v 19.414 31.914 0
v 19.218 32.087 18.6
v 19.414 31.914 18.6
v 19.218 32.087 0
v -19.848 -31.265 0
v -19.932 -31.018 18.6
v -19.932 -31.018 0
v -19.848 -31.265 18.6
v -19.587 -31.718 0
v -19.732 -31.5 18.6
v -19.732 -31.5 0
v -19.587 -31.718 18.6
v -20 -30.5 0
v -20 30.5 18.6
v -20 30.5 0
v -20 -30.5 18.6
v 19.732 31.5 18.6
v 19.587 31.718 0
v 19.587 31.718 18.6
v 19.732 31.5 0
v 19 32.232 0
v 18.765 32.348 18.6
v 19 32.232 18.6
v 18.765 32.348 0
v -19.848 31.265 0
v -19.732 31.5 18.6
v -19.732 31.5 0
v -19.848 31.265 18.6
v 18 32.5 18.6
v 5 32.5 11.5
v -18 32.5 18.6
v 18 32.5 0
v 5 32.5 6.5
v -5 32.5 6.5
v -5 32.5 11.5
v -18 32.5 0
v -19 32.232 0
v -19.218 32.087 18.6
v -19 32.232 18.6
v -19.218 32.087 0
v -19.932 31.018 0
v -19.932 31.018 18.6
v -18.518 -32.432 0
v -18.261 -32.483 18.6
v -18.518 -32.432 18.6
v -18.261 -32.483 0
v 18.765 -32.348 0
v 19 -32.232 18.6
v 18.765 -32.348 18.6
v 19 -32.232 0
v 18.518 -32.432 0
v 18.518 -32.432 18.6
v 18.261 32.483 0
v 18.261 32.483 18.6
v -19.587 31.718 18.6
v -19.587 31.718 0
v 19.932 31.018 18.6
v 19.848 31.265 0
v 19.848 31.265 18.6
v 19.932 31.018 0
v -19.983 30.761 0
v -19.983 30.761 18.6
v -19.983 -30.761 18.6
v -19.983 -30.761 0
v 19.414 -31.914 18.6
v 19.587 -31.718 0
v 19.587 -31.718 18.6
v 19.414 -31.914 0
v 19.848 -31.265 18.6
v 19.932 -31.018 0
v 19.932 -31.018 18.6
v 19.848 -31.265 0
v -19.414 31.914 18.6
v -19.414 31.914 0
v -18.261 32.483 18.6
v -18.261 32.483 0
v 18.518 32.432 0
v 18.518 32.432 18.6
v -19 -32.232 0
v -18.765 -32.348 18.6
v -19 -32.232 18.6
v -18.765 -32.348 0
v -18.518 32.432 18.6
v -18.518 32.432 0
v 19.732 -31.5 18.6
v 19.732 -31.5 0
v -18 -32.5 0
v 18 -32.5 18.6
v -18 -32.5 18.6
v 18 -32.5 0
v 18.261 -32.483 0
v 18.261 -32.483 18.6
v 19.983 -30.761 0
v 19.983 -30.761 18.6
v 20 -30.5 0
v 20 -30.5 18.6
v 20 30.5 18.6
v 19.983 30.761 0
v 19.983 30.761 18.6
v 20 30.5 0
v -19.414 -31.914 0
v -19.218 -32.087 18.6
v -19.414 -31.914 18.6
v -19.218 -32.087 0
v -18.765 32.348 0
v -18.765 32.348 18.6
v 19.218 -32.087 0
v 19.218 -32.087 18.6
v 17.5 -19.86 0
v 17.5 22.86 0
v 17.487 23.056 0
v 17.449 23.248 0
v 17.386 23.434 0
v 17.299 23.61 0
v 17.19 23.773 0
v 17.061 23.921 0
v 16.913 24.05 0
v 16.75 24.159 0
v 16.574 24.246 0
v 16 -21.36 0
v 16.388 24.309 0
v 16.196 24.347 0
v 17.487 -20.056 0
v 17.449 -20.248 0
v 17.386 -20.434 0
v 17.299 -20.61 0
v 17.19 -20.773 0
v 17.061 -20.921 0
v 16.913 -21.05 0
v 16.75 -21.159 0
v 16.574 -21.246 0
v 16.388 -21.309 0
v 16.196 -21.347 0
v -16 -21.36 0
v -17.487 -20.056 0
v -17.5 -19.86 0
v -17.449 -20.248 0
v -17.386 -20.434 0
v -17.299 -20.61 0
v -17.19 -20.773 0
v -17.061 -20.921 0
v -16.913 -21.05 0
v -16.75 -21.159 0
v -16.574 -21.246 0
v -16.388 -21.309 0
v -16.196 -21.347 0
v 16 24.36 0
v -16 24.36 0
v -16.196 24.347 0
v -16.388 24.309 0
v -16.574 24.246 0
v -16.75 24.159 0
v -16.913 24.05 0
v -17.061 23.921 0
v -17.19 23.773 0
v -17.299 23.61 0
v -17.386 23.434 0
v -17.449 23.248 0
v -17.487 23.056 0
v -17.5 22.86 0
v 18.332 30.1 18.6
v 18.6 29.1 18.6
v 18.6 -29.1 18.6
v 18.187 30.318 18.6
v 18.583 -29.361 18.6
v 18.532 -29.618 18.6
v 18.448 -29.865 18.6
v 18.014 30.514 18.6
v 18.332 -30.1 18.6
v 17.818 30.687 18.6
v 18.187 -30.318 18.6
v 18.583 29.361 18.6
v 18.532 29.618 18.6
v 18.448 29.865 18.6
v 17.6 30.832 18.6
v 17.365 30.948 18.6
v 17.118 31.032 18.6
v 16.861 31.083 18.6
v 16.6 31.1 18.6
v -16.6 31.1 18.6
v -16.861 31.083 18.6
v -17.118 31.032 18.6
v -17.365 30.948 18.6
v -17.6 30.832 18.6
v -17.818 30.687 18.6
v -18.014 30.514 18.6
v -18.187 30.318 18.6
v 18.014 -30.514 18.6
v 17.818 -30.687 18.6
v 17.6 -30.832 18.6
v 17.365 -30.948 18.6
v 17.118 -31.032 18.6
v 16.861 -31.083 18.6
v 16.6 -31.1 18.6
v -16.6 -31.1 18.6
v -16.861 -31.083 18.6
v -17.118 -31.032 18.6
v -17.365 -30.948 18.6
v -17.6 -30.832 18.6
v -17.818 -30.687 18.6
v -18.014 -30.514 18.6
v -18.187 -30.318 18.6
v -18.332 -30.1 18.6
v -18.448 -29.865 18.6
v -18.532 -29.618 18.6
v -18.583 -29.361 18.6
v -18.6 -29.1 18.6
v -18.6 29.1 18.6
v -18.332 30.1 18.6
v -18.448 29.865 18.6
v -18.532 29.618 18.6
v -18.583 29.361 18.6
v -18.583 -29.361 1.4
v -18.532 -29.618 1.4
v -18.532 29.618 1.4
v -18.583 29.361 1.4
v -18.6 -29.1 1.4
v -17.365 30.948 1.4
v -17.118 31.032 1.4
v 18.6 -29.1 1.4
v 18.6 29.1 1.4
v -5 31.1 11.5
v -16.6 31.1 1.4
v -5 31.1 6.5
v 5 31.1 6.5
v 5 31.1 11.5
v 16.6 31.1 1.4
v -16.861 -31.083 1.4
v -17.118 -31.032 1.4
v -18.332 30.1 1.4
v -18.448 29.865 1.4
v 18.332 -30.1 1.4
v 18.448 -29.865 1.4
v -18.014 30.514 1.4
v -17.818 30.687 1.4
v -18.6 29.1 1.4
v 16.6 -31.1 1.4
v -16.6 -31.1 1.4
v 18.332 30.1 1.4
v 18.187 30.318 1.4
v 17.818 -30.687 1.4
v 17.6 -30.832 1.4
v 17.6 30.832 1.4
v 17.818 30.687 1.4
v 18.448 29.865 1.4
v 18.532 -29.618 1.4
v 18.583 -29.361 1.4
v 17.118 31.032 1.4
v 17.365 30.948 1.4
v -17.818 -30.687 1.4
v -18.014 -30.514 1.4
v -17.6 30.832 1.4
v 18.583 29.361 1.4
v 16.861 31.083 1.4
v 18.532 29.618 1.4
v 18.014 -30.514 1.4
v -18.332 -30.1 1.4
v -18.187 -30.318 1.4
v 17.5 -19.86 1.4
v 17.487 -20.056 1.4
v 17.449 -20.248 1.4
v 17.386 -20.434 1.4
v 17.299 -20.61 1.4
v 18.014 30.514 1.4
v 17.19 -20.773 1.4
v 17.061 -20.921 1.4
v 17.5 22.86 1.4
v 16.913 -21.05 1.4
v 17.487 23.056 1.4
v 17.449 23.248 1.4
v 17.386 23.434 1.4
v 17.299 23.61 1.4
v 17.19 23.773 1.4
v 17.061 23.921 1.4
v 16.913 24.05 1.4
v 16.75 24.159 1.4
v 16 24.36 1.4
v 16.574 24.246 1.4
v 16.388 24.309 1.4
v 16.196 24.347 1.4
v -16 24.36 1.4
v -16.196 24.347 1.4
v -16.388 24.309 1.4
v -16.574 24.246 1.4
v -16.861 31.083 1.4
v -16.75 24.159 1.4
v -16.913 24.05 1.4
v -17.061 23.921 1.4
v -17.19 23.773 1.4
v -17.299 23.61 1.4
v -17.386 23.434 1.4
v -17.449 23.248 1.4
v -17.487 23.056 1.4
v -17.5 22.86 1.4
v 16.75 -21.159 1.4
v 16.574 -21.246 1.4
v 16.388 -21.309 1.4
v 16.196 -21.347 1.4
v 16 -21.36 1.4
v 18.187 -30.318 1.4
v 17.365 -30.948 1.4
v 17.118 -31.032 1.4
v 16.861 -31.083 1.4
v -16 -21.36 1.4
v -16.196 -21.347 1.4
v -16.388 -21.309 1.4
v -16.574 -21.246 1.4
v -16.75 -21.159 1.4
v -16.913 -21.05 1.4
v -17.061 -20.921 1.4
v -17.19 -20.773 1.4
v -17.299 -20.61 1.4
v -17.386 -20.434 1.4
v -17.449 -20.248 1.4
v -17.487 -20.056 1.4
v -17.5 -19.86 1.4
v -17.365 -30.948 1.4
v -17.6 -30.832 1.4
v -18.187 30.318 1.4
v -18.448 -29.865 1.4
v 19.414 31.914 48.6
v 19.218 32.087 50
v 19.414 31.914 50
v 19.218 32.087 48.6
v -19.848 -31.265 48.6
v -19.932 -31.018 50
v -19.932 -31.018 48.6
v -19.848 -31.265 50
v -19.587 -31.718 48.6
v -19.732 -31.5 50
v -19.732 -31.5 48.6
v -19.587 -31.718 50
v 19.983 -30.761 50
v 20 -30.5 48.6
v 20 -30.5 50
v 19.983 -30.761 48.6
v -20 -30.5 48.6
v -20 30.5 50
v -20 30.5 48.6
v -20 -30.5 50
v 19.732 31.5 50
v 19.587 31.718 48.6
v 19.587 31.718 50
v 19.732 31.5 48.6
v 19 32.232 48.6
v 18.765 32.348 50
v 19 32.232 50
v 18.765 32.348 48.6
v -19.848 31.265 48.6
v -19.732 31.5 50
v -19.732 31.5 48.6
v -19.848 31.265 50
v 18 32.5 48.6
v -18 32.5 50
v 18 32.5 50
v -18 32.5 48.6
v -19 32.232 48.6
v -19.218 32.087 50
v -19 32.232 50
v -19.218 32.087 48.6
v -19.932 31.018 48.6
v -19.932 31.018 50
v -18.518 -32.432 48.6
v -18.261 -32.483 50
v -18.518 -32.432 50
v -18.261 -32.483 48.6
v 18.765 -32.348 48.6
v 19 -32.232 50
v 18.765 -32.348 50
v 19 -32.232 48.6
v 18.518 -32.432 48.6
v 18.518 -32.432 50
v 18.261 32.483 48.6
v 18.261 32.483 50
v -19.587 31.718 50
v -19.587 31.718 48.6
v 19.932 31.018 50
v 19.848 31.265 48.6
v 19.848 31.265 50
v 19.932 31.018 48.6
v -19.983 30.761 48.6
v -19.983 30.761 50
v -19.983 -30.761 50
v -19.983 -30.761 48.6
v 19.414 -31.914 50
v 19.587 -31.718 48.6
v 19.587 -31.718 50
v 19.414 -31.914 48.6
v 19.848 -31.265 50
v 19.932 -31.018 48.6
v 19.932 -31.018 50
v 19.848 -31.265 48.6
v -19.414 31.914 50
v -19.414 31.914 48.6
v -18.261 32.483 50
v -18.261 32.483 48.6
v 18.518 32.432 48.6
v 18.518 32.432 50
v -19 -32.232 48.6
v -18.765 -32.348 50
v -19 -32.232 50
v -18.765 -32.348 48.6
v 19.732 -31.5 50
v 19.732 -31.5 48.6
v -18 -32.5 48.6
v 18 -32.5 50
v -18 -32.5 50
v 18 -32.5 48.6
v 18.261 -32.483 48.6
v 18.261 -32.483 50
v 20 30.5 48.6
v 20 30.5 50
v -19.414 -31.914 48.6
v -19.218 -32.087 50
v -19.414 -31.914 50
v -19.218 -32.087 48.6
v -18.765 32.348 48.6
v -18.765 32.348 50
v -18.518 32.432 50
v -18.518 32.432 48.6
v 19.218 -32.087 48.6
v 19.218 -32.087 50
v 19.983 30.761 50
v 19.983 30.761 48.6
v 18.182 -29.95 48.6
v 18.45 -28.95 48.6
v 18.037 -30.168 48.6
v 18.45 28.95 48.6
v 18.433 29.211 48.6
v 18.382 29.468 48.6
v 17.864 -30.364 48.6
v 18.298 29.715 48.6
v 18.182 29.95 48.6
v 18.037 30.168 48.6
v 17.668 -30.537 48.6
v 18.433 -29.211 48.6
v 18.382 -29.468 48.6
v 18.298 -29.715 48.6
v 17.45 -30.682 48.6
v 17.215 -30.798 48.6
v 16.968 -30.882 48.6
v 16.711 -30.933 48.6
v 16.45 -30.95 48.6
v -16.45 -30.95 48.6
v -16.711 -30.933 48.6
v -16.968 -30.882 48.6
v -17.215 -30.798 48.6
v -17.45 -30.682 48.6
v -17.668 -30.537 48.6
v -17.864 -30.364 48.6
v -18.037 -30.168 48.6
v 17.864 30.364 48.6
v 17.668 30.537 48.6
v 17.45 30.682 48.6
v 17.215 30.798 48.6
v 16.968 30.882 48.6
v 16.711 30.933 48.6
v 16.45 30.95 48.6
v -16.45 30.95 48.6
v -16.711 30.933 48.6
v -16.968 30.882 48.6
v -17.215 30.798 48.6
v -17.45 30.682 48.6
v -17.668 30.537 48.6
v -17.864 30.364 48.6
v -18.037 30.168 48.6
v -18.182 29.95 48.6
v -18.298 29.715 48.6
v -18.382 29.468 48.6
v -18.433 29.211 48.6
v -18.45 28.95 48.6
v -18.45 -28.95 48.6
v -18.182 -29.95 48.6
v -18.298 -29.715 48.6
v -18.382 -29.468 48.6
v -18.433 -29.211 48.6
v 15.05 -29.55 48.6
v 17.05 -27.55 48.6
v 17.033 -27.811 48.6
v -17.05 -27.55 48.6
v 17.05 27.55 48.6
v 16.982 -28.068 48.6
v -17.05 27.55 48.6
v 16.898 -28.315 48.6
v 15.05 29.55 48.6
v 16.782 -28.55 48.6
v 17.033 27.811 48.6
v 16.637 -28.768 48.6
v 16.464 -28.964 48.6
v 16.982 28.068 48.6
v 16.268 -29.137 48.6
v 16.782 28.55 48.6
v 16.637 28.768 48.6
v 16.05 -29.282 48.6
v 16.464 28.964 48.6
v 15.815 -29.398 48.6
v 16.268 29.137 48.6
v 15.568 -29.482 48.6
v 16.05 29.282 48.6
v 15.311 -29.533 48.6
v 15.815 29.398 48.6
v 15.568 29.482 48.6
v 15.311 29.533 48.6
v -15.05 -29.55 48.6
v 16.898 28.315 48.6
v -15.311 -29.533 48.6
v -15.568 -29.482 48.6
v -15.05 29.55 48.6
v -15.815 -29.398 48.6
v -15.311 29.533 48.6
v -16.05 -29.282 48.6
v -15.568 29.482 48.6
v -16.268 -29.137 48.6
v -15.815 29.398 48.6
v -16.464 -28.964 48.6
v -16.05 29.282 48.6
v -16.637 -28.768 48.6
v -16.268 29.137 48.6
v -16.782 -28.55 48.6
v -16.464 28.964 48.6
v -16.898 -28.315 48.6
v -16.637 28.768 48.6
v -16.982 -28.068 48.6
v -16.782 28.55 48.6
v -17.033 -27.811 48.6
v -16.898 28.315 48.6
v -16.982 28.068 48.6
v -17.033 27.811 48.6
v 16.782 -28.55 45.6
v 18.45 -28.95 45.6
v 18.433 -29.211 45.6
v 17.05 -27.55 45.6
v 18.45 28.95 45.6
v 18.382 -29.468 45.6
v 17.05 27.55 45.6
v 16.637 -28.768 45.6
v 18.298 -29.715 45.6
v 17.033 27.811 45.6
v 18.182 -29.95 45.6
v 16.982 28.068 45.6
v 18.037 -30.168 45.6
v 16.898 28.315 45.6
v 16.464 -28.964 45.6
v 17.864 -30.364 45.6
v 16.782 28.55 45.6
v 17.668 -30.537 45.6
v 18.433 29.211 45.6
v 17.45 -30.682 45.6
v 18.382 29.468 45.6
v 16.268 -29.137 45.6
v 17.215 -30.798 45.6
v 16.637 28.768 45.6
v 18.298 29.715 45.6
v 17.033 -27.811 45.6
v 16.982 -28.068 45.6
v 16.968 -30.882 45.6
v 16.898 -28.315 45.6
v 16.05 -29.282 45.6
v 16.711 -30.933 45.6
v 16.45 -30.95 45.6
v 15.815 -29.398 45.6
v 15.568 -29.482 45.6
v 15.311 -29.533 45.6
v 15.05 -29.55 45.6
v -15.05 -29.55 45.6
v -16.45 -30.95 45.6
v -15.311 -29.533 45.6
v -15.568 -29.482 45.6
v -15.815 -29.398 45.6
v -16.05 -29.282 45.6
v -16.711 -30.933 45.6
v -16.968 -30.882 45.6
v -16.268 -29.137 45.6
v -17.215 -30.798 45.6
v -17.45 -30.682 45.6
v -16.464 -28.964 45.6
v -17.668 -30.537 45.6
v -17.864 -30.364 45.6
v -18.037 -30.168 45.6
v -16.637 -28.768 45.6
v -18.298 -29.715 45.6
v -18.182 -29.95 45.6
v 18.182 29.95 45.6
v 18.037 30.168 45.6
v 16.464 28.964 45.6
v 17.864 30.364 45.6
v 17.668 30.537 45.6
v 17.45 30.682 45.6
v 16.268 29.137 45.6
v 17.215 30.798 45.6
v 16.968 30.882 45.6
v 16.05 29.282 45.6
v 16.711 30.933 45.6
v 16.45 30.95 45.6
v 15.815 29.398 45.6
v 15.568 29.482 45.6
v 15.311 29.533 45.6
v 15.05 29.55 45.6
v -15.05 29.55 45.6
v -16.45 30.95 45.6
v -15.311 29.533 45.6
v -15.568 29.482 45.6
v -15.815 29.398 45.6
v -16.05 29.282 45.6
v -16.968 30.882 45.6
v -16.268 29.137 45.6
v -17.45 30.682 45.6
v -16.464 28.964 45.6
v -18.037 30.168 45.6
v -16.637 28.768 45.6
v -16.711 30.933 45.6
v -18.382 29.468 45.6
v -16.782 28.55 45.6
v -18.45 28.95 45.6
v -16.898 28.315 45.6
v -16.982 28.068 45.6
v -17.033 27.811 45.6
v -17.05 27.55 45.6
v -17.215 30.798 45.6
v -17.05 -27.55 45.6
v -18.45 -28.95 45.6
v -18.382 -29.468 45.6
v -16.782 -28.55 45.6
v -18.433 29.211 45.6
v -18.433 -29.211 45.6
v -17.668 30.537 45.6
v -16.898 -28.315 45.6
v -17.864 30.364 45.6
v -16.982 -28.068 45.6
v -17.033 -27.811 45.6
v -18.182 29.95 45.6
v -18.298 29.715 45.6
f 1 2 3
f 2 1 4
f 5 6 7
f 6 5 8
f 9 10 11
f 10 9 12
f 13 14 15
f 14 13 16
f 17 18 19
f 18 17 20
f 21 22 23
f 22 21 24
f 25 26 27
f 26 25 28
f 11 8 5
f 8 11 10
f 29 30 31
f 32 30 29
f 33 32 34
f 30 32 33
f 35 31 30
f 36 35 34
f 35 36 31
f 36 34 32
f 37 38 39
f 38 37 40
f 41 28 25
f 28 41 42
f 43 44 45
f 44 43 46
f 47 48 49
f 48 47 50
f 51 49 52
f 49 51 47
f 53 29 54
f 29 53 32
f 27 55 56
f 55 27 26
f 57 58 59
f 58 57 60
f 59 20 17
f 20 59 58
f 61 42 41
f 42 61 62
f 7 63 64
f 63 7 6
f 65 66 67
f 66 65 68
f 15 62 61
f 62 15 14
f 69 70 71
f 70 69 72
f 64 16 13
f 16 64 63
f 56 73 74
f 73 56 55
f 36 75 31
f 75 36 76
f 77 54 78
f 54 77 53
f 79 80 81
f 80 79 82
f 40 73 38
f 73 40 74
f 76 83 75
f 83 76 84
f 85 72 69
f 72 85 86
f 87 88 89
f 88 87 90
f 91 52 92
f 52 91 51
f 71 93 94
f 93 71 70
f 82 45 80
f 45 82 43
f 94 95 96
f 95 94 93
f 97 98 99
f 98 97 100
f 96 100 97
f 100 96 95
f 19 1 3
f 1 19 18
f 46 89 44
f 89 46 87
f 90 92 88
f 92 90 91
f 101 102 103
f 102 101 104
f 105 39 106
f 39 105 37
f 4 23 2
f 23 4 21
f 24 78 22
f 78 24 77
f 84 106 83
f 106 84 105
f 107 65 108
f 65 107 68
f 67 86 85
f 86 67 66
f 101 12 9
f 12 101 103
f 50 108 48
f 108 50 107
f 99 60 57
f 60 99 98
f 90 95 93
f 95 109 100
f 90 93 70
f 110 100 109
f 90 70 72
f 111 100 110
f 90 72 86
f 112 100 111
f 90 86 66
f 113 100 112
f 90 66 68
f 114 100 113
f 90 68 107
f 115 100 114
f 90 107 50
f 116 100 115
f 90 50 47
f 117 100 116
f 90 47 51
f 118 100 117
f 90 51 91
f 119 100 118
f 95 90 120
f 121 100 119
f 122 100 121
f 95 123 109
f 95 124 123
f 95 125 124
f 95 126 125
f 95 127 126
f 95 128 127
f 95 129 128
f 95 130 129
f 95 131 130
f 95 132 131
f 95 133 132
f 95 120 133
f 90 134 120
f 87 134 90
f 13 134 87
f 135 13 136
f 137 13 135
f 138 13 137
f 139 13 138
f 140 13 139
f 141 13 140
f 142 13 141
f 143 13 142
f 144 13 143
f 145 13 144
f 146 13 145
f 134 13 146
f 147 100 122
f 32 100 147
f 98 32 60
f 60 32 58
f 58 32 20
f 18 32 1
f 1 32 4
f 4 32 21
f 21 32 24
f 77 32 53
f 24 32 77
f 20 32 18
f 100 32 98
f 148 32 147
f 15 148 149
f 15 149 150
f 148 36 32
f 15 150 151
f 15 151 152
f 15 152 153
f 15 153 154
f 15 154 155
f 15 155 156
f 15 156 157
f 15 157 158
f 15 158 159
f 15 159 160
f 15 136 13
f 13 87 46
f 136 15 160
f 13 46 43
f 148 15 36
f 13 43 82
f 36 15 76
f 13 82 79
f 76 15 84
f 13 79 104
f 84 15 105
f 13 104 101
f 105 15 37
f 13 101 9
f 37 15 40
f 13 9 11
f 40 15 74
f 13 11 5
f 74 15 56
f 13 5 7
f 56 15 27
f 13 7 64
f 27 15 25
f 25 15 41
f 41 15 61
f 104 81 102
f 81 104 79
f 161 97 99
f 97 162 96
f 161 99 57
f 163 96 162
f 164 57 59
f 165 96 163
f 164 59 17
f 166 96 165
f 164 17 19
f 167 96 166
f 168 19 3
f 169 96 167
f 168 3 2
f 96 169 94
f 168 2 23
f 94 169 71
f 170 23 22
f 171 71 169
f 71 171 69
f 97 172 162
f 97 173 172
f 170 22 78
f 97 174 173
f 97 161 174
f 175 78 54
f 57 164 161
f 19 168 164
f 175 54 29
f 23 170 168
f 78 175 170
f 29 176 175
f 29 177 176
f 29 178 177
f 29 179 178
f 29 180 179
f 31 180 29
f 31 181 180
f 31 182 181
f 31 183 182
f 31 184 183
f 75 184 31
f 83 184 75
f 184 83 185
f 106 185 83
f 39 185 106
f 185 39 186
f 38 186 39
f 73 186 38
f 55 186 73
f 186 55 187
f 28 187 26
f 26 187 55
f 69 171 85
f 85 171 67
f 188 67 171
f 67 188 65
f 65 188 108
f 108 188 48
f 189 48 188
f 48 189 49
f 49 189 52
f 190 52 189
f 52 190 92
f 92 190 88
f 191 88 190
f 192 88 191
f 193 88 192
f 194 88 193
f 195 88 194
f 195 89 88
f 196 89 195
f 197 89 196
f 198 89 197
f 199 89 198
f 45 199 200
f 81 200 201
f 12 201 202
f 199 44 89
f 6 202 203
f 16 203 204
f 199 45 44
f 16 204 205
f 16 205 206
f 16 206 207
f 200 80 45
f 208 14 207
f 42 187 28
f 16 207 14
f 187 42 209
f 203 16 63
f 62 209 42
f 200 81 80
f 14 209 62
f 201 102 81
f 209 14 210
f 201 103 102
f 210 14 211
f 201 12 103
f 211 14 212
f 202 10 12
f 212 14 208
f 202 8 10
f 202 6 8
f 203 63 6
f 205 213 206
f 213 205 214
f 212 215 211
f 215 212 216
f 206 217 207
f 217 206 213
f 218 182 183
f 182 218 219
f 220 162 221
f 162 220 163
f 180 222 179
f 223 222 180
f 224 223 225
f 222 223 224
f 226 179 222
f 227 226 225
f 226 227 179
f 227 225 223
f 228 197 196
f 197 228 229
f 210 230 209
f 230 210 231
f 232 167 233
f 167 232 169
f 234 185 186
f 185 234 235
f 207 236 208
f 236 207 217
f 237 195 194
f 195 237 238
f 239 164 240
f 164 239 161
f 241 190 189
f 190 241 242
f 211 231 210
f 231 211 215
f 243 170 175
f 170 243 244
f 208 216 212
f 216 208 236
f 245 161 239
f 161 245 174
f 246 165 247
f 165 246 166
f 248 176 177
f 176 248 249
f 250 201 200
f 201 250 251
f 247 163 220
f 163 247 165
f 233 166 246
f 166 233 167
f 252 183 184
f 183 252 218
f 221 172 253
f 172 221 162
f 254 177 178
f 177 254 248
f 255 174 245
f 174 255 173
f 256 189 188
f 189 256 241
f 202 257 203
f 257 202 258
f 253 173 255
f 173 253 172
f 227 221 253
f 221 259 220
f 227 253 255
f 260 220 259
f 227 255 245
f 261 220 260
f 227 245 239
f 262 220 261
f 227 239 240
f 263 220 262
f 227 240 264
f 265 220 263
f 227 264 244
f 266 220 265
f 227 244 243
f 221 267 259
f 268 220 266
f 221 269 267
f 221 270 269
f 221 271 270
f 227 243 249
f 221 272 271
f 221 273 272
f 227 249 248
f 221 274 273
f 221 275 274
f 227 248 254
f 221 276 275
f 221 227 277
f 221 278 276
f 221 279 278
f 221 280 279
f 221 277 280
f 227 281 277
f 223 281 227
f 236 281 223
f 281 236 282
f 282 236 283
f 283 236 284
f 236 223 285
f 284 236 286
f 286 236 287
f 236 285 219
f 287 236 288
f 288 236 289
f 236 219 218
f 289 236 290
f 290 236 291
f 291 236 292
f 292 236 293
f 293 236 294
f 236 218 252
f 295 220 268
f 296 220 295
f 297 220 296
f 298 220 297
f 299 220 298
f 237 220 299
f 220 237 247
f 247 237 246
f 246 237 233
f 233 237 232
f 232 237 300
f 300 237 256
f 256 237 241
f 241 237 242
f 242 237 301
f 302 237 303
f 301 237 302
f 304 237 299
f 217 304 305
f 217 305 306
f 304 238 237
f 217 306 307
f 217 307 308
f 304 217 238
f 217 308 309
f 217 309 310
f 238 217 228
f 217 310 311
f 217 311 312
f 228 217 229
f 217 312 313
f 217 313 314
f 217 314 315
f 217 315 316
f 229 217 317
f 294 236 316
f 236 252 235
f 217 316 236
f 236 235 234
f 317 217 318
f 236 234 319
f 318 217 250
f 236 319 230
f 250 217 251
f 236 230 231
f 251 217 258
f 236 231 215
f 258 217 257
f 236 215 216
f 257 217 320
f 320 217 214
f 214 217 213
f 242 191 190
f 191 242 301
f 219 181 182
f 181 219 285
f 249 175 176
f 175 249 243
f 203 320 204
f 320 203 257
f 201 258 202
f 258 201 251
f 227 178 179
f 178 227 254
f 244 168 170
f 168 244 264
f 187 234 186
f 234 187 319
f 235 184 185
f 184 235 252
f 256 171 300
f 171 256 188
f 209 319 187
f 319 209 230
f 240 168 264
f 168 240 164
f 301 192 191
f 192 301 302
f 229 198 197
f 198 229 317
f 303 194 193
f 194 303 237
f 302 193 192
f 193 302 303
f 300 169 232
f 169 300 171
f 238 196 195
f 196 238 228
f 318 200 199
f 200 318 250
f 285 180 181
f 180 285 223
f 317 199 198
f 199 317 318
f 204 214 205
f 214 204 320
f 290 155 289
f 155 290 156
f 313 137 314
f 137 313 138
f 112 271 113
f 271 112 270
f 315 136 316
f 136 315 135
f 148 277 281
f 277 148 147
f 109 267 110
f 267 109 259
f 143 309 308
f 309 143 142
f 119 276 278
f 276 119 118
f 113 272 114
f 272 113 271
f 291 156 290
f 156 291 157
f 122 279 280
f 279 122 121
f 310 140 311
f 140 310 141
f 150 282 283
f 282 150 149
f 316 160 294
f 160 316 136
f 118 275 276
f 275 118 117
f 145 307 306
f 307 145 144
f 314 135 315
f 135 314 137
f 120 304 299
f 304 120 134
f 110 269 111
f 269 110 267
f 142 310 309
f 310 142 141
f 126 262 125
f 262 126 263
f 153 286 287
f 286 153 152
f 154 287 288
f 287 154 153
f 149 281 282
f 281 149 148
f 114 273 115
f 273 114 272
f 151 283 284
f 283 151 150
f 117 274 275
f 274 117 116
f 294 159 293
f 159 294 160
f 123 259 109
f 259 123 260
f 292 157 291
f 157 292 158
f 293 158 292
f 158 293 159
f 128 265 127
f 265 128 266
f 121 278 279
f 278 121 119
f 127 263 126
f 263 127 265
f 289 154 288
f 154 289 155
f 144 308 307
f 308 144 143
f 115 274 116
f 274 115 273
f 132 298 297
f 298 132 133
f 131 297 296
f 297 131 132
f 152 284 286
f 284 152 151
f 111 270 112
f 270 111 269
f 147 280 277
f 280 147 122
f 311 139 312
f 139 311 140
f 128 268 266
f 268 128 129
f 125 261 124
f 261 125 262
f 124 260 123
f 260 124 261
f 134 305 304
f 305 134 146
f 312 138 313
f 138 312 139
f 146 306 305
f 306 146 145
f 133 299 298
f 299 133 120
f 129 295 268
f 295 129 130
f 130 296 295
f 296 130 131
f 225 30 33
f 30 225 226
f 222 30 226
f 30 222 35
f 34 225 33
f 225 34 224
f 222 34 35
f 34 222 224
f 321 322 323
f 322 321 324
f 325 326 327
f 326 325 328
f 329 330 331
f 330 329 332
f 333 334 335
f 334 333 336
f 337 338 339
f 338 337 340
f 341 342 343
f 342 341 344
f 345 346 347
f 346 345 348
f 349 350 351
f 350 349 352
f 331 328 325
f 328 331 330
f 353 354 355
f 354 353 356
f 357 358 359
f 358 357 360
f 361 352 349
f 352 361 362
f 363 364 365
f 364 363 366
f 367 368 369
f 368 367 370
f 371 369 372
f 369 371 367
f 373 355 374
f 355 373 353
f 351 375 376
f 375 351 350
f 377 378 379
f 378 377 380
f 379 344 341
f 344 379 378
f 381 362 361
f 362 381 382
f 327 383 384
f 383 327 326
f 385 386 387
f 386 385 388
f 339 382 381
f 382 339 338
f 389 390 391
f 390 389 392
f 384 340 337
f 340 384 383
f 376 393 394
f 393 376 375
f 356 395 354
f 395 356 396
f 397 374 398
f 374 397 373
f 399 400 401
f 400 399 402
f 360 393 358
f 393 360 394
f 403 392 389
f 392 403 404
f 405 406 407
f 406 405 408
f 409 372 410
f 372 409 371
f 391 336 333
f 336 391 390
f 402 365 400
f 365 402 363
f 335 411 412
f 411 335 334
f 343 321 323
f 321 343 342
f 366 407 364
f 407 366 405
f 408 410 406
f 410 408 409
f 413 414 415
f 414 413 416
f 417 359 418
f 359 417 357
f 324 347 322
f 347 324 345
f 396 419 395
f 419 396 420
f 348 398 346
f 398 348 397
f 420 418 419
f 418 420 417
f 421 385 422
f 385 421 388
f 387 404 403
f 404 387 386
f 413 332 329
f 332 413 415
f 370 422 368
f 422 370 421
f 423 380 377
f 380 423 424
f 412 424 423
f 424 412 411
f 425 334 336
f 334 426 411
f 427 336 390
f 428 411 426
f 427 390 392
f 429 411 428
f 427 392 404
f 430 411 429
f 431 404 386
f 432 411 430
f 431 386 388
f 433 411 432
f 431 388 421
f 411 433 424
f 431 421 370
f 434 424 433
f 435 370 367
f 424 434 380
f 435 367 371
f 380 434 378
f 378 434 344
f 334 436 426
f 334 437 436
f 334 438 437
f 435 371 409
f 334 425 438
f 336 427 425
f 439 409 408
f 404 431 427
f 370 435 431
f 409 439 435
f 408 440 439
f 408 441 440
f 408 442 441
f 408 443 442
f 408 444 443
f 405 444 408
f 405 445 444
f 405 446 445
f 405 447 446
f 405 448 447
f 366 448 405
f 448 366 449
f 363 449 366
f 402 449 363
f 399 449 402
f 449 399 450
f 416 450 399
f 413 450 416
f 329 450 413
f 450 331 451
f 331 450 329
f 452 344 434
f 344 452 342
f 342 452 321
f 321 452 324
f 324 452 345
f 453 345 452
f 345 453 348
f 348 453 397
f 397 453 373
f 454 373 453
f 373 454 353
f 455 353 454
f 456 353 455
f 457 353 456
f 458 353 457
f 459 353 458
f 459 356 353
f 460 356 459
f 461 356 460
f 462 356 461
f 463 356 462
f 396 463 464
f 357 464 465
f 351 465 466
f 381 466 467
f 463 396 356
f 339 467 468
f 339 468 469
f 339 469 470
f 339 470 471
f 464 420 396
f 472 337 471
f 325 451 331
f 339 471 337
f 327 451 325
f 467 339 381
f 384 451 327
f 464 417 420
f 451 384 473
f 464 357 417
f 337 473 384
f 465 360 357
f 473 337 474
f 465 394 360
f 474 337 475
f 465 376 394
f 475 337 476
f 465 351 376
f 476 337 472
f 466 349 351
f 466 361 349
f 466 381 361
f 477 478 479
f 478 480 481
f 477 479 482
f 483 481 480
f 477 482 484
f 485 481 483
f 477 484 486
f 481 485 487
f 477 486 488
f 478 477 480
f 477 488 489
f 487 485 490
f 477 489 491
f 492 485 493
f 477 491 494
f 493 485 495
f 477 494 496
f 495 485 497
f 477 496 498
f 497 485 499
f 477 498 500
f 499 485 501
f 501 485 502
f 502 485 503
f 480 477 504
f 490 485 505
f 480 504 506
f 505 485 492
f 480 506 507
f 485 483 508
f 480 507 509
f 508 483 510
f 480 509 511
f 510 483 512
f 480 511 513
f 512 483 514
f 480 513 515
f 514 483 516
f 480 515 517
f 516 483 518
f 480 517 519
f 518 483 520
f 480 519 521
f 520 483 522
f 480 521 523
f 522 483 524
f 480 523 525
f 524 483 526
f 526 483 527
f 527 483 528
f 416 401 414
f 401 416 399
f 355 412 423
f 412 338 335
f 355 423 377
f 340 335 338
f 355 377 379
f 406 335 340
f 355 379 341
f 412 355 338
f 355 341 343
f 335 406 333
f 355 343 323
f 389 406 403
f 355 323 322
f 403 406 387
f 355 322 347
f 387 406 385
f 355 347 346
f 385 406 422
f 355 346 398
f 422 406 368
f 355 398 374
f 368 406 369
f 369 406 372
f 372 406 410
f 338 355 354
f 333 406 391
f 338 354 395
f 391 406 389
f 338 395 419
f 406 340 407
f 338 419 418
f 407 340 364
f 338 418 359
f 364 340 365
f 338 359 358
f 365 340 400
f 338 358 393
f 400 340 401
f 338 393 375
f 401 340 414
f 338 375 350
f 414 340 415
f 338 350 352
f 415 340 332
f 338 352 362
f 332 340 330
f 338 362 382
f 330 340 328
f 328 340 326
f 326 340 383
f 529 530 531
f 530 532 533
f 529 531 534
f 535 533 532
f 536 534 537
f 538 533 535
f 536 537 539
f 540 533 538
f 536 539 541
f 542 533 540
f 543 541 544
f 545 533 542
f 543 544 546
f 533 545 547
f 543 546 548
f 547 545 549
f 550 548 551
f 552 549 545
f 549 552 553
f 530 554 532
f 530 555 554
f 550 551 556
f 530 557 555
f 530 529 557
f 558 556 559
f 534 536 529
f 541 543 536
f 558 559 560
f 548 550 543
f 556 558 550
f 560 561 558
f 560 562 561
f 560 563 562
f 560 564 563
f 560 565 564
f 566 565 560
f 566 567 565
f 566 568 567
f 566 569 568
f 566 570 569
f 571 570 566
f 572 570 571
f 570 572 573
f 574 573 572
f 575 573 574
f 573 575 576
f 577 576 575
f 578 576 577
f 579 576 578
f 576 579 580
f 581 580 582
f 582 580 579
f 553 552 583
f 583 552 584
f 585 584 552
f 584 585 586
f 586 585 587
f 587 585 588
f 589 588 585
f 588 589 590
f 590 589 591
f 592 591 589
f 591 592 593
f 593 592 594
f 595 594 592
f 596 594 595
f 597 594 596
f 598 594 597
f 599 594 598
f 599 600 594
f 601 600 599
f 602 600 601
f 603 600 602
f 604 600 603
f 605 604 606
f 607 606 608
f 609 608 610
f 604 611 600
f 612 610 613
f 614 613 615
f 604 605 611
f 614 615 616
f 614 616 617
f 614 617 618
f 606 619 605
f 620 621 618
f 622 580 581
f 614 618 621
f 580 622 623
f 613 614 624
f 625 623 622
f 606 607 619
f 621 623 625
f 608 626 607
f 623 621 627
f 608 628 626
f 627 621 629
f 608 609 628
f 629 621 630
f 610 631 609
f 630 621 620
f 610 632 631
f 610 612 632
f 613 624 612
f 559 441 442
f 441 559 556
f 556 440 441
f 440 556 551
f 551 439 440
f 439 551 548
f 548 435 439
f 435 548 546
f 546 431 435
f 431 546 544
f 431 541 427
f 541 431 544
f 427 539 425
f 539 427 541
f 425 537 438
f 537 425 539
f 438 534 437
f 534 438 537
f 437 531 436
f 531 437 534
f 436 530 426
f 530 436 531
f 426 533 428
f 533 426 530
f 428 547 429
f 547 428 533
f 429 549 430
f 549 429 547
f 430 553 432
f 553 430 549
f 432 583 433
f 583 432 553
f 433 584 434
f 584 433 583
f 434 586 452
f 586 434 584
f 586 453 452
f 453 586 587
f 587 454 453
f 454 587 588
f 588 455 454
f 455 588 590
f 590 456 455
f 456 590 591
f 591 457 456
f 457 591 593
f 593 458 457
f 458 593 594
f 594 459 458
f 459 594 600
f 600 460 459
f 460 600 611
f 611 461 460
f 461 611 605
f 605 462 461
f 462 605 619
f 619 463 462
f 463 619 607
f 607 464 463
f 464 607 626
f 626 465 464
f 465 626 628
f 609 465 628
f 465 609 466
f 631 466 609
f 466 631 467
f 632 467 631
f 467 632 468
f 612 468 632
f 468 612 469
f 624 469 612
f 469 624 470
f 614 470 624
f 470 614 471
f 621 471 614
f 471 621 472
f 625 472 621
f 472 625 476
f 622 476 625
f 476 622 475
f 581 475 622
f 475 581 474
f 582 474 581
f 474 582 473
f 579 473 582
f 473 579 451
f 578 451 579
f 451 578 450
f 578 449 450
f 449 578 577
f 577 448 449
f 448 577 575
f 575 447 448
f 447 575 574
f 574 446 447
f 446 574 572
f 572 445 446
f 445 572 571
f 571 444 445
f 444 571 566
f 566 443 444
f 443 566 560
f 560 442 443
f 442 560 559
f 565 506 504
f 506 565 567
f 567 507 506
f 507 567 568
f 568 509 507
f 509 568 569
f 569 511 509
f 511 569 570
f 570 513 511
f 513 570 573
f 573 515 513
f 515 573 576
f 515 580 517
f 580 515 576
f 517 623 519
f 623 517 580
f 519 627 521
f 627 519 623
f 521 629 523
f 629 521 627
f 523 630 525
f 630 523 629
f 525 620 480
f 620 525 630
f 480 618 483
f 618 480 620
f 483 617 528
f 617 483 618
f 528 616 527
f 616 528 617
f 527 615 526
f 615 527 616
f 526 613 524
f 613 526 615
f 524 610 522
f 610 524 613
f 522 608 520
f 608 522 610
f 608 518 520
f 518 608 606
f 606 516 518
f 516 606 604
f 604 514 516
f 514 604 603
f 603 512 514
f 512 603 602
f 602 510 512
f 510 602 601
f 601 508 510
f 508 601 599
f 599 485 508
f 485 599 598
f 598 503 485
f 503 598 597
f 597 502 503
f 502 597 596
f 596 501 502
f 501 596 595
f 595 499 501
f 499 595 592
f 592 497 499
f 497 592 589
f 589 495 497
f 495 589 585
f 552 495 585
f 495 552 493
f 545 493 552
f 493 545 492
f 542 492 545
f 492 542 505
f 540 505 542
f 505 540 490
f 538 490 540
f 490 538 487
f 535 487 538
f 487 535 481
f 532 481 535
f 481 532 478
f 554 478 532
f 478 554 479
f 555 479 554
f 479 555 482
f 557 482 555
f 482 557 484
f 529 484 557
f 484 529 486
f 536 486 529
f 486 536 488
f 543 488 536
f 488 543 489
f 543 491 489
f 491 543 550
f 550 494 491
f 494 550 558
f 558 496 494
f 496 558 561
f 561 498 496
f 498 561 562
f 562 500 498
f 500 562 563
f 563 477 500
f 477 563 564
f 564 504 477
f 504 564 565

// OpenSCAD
// ============================================================================
// Brobot enclosure — "sandwich" case for the 1.8" 128x160 SPI TFT display
// + an ESP32-C3 SuperMini GLUED to the back of the display PCB.
//
// Fixed external dimensions (as specified — do not derive these from margins):
//   Largura (width, X)  = 40mm
//   Comprimento (Y)     = 65mm
//   Altura (depth, Z)   = 40mm
//
// ONE main body (front face + all 4 side walls, open only at the very back)
// plus ONE flat lid that press-fits over that opening. Not two shells of
// similar size — the lid is just a thin cap.
//
// Layout (front -> back), all inside the single BODY:
//   [ front wall + screen window ]
//   [ display PCB glued flush against the inner front face, screen forward ]
//   [ ESP32-C3 SuperMini glued flat to the BACK of the display PCB,     ]
//   [ rotated so its USB-C connector sits flush with the board's edge, ]
//   [ exiting through a cutout in the body's side wall (lateral)       ]
//   [ ...remaining depth is open (spare room for a battery etc. later) ]
//   ---- open back, closed by the LID ----
//
// The lid has a thin press-fit spigot rim that plugs into the body's open
// cavity (no screws, no extra size). Both boards are glued in — the display
// flush against the inner front face, the ESP32 on top of it — before the
// lid is pressed shut.
//
// WINDOW SIZE NOTE: 45.72mm is 1.8in x 25.4 — the DIAGONAL spec printed on
// the board ("1.8 TFT"), not its actual width/height. The real visible glass
// on this panel is roughly 28mm x 35mm. This file cuts the window at the
// requested 35mm x 45.72mm anyway (nearly the size of the whole case) — that
// exposes PCB/bezel around the actual screen, it's not a mistake, just a
// deliberate choice confirmed by whoever specified these numbers.
//
// HOW TO USE:
//   1. Install OpenSCAD (free): https://openscad.org/downloads.html
//   2. Open this file. Measure YOUR actual boards with calipers and update
//      the "MEASURE AND ADJUST" block below — especially the display's
//      mounting-hole positions, and exactly where the ESP32 can be glued
//      without landing on top of the SD-card holder or other components.
//   3. Set render_part below to preview/export each part.
//   4. F6 (render) then File > Export > Export as STL for each part.
// ============================================================================

// ---- what to show -----------------------------------------------------
// "assembled" = body + lid in place (visual check only, don't print this)
// "exploded"  = body + lid pulled apart along Z (visual check)
// "body"      = main body alone, oriented for printing (print this)
// "lid"       = lid alone, oriented for printing (print this)
render_part = "exploded"; // ["assembled","exploded","body","lid"]

$fn = 48; // smoothness of circles/cylinders

// ============================================================================
// FIXED CASE DIMENSIONS — as specified, do not derive these from margins
// ============================================================================

case_w = 40.0; // Largura
case_l = 65.0; // Comprimento
case_d = 20.0; // Altura (sandwich depth)

// ============================================================================
// MEASURE AND ADJUST — these are estimates, verify against your real parts
// ============================================================================

// ---- 1.8" 128x160 SPI TFT display board (34mm x 58mm PCB, per photo) ----
disp_w        = 34.0;   // PCB width
disp_l        = 58.0;   // PCB length
disp_pcb_t    = 1.6;    // PCB thickness

// True visible glass, for reference only (NOT the window size — see note above).
// active_w_ref = 28.0; active_h_ref = 35.0;

// Window opening in the front face — set exactly as requested: 35mm on the
// case's width axis, 45.72mm on the case's length axis. Centered on the
// board by default.
window_w    = 35.0;
window_l    = 45.72;
window_off_x = 0;
window_off_y = 0;

// ---- ESP32-C3 SuperMini, glued to the back of the display PCB ----
// Mounted in its natural (unrotated) orientation: esp_l (with the USB-C
// connector on one short end) runs along the case's Y axis, same as the
// display board's own long axis, so the connector lands flush with the
// display board's TOP edge (away from the pin header at the bottom) and
// exits through the small end wall there — the 40mm x 20mm wall at the
// end of the 65mm axis. Flip esp_usb_side to -1 to exit through the
// BOTTOM end wall instead (tight — that's the header/wiring side).
esp_w = 18.0;   // X-extent
esp_l = 22.5;   // Y-extent; USB-C is on this edge
esp_t = 6.0;    // thickness incl. USB-C connector shell — glued directly on the PCB back
esp_center_x_offset = 0; // shift ESP32 along X from board-center to dodge the SD-card holder — MEASURE AND ADJUST
esp_usb_side = 1; // +1 = exits on the +Y (top) end wall, -1 = -Y (bottom, header side)

usb_cut_w = 10.0; // opening width (X), generous tolerance around the ~9mm connector
usb_cut_h = 5.0;  // opening height (Z), generous tolerance around the ~3.6mm connector
usb_cut_z_offset = 3.0; // shift the opening deeper into the case (+Z) from the ESP32's own depth

// ============================================================================
// DERIVED GEOMETRY
// ============================================================================

wall  = 1.4; // body wall thickness — thin, on purpose, to hit the fixed case size
lid_t = 1.4; // lid thickness

// board is centered in X; in Y it's pushed toward the top, leaving whatever's
// left at the bottom for the pin row + wires
top_margin    = 0.6;
bottom_margin = case_l - disp_l - top_margin - 2*wall; // ~3.6mm — tight, assumes wires soldered flat, no tall header

body_depth = case_d - lid_t; // the body IS the case, minus the thin cap at the very back

corner_r = 2.0; // outer corner rounding

// press-fit spigot on the lid, plugging into the body's open cavity
// (no screws — no room for corner bosses at this footprint)
spigot_len       = 3.0;
spigot_clearance = 0.3;

// ============================================================================
// HELPERS
// ============================================================================

module rounded_rect(w, l, r) {
    hull() {
        for (x = [-1, 1], y = [-1, 1])
            translate([x*(w/2 - r), y*(l/2 - r)])
                circle(r = r);
    }
}

module rounded_box(w, l, h, r) {
    linear_extrude(height = h)
        rounded_rect(w, l, r);
}

disp_center_x = 0;
disp_center_y = case_l/2 - wall - top_margin - disp_l/2;

// ESP32 center: Y flush against the board's own edge (toward esp_usb_side),
// X centered on the board by default, offset by esp_center_x_offset
esp_center_x = disp_center_x + esp_center_x_offset;
esp_center_y = disp_center_y + esp_usb_side * (disp_l/2 - esp_l/2);

// Z-depth (local to the body, z=0 at the front outer face) where the
// glued-on ESP32 sits: right behind the display PCB, which is glued flush
// against the inner front face
esp_z0 = wall + disp_pcb_t;

// ============================================================================
// BODY — front face + all 4 side walls, screen window, USB-C side cutout.
// Open at the back; this is nearly the whole case. The display glues flush
// against the inner front face (no standoffs, no screws).
// ============================================================================

module body() {
    difference() {
        // outer shell, open at the back (z=0 is the front outer face)
        difference() {
            rounded_box(case_w, case_l, body_depth, corner_r);
            translate([0, 0, wall])
                rounded_box(case_w - 2*wall, case_l - 2*wall, body_depth, corner_r);
        }

        // screen window
        translate([disp_center_x + window_off_x, disp_center_y + window_off_y, -0.5])
            linear_extrude(height = wall + 1)
                rounded_rect(window_w, window_l, 1.5);

        // USB-C cutout through the small end wall (40mm x 20mm, at the end of
        // the 65mm axis), at the depth where the glued ESP32 sits behind the
        // display. Centered on the wall's mid-thickness so it actually
        // straddles the wall regardless of which end it's on (cube() always
        // grows in +Y from its translate point).
        translate([esp_center_x - usb_cut_w/2, esp_usb_side * (case_l/2 - wall/2) - (wall + 1)/2, esp_z0 + esp_t/2 - usb_cut_h/2 + usb_cut_z_offset])
            cube([usb_cut_w, wall + 1, usb_cut_h]);
    }
}

// ============================================================================
// LID — a flat cap over the body's open back, with a press-fit spigot rim.
// Not a second shell: just a thin plate.
// ============================================================================

module lid() {
    // flat plate — the true exterior back face
    rounded_box(case_w, case_l, lid_t, corner_r);

    // press-fit spigot: thin rim projecting forward into the body's cavity
    translate([0, 0, -spigot_len])
        linear_extrude(height = spigot_len)
            difference() {
                rounded_rect(case_w - 2*wall - spigot_clearance, case_l - 2*wall - spigot_clearance, corner_r);
                rounded_rect(case_w - 4*wall - spigot_clearance, case_l - 4*wall - spigot_clearance, corner_r);
            }
}

// ============================================================================
// OUTPUT
// ============================================================================

if (render_part == "assembled") {
    color("SlateGray") body();
    color("DimGray") translate([0, 0, body_depth]) lid();
} else if (render_part == "exploded") {
    color("SlateGray") body();
    color("DimGray") translate([0, 0, body_depth + 30]) lid();
} else if (render_part == "body") {
    body();
} else if (render_part == "lid") {
    // flip so it prints with the flat outer face down against the print bed
    translate([0, 0, lid_t]) rotate([180, 0, 0]) lid();
}
